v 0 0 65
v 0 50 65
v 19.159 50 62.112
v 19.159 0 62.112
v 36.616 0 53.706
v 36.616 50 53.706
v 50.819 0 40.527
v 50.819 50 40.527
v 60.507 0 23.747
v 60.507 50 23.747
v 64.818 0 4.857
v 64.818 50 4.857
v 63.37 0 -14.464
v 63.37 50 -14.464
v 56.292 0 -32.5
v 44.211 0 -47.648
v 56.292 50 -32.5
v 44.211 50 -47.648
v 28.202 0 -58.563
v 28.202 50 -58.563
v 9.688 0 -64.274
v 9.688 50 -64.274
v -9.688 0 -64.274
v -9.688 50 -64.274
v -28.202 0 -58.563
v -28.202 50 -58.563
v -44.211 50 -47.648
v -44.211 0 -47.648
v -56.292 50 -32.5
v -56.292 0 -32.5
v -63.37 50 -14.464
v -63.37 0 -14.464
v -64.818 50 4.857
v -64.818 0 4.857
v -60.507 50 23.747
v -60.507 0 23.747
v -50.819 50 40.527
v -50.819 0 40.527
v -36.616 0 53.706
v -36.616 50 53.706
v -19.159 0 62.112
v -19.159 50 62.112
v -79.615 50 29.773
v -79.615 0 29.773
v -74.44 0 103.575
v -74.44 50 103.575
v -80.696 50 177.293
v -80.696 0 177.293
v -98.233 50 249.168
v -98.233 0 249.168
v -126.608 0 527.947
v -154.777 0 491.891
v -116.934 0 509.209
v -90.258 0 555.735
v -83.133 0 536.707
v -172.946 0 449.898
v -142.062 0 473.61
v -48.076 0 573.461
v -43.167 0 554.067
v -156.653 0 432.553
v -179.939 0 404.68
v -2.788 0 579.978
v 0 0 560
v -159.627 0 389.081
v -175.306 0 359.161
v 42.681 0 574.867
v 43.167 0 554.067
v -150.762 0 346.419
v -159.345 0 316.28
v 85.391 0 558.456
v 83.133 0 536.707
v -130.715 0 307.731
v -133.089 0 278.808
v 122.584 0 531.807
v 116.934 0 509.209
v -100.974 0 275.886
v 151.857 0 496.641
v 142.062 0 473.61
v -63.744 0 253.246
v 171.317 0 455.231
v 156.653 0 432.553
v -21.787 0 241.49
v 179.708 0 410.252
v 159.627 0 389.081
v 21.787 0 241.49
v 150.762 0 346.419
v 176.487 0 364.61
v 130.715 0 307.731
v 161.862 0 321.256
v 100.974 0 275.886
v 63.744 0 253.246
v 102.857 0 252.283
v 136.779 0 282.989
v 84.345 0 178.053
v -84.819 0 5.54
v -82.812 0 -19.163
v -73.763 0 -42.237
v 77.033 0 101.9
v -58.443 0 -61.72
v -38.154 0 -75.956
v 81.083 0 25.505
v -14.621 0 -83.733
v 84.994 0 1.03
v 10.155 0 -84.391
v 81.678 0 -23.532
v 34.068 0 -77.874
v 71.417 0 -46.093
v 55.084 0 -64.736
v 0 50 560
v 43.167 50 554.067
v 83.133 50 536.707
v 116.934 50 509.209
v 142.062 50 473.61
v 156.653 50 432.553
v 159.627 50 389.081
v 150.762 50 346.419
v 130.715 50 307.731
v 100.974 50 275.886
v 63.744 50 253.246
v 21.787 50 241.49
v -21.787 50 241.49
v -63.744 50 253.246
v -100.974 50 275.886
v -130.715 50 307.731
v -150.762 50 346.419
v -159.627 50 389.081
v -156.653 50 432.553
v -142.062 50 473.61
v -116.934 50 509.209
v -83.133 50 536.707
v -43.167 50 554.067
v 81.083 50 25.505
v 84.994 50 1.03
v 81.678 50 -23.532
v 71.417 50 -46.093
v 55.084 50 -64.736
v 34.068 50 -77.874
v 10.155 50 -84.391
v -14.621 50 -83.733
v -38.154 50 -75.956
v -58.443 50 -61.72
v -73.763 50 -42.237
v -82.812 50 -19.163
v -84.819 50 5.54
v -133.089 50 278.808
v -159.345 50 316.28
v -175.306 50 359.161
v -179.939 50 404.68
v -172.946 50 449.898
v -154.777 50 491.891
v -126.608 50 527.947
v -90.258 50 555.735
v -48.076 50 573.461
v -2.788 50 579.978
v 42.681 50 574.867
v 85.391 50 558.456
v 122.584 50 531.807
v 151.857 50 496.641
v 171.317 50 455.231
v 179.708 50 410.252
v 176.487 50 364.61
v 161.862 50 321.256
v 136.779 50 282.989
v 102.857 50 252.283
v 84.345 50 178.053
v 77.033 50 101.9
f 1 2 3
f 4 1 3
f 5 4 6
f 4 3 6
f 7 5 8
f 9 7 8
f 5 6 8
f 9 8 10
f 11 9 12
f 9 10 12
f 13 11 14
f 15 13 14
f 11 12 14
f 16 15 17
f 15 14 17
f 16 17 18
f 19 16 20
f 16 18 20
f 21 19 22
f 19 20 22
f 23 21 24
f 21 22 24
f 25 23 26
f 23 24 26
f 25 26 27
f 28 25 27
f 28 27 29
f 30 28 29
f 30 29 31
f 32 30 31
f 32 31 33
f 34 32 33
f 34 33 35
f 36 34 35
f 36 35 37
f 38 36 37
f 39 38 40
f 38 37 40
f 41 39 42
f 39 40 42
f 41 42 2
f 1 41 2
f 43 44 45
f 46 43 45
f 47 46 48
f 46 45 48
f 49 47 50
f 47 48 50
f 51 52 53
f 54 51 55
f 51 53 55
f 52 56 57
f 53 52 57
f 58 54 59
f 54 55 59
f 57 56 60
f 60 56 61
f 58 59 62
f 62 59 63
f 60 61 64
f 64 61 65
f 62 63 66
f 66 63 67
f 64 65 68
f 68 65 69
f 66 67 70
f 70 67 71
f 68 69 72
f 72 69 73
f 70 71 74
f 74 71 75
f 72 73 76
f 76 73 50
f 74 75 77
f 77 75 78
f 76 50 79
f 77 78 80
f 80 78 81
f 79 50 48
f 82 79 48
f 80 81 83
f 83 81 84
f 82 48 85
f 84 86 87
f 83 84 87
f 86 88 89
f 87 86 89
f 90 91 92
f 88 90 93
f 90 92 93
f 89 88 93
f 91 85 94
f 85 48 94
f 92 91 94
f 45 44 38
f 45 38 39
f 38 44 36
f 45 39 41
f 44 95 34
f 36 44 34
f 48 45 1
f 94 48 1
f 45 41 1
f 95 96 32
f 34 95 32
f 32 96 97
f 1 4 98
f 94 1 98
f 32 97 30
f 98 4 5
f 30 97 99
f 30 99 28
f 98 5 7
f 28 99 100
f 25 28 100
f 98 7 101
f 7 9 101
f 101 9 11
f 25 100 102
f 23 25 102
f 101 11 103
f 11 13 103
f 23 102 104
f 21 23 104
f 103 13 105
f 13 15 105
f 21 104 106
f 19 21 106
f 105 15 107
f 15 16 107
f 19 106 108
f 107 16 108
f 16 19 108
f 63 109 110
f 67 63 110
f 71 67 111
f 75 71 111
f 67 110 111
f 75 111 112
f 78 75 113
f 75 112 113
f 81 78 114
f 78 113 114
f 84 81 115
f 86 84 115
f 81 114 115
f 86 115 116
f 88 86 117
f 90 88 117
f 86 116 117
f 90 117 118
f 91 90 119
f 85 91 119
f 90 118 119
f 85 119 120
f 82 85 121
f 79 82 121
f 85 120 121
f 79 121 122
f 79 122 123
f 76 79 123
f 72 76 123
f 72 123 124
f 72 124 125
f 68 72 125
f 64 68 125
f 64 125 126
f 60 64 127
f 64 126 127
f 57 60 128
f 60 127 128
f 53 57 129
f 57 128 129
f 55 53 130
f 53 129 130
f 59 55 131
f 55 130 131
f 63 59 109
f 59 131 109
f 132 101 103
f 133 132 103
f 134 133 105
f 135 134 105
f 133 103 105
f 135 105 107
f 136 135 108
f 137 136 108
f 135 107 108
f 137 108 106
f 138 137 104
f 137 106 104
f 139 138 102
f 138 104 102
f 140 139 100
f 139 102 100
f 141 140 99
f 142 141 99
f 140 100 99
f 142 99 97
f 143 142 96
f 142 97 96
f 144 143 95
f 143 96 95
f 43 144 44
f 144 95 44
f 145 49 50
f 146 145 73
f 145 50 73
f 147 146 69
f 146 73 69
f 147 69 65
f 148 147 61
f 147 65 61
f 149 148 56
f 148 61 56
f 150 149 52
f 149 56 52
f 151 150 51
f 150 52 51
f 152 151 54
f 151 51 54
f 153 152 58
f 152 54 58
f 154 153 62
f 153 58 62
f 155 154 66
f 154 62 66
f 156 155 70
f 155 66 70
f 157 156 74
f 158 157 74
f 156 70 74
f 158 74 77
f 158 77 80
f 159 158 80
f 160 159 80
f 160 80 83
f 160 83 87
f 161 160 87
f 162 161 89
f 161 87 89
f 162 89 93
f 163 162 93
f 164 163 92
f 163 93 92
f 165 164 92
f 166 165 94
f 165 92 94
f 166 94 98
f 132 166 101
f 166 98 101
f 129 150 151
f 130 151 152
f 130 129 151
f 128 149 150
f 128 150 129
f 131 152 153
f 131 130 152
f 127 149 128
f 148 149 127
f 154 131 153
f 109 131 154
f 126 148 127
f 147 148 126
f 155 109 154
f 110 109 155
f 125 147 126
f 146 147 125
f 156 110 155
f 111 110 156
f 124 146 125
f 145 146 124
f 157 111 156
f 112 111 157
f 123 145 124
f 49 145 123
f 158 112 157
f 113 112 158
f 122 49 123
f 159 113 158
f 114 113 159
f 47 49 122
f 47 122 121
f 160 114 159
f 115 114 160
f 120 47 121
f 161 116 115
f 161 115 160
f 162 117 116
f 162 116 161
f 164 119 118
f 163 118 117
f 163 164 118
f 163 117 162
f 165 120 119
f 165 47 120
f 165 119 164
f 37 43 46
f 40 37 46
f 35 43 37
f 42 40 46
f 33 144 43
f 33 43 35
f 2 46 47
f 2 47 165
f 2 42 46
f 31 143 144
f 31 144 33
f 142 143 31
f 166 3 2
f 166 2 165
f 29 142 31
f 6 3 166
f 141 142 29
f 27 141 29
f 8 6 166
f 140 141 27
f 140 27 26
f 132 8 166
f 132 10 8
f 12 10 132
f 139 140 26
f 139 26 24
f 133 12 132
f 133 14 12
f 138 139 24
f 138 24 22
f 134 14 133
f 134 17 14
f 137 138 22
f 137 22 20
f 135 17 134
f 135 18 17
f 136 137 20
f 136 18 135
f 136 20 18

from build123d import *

# Parameters (mm, degrees)
BOSS_EXTRUDE1_DEPTH = 50
SKETCH5_R           = 65
CUT_EXTRUDE3_DEPTH  = 50
SKETCH4_R           = 160
CUT_EXTRUDE4_DEPTH  = 50


with BuildPart() as part:
    # Sketch1 → Boss-Extrude1 (new body)
    with BuildSketch(Plane(origin=(0, 0, 0), x_dir=(1, 0, 0), z_dir=(0, 1, 0))):
        with BuildLine():
            ThreePointArc((-79.615153419, -29.772929752), (-76.142301846, -140.554949646), (-98.232528839, -249.167741256))
            ThreePointArc((-98.232528839, -249.167741256), (-2.78801704, -579.97840693), (102.857311412, -252.28279217))
            ThreePointArc((102.857311412, -252.28279217), (79.272553954, -140.112834924), (81.083403738, -25.504541524))
            ThreePointArc((81.083403738, -25.504541524), (-2.256928059, 84.970031633), (-79.615153419, -29.772929752))
        make_face()
    extrude(amount=BOSS_EXTRUDE1_DEPTH)

    # Sketch5 → Cut-Extrude3 (cut)
    with BuildSketch(Plane(origin=(0, 50, 0), x_dir=(1, 0, 0), z_dir=(0, 1, 0))):
        with Locations(Location((0, 0, 0), (0, 0, 270))):
            Circle(SKETCH5_R)
    extrude(amount=-CUT_EXTRUDE3_DEPTH, mode=Mode.SUBTRACT)

    # Sketch4 → Cut-Extrude4 (cut)
    with BuildSketch(Plane(origin=(0, 50, 0), x_dir=(1, 0, 0), z_dir=(0, 1, 0))):
        with Locations(Location((0, -400, 0), (0, 0, 270))):
            Circle(SKETCH4_R)
    extrude(amount=-CUT_EXTRUDE4_DEPTH, mode=Mode.SUBTRACT)


solid = part.part
